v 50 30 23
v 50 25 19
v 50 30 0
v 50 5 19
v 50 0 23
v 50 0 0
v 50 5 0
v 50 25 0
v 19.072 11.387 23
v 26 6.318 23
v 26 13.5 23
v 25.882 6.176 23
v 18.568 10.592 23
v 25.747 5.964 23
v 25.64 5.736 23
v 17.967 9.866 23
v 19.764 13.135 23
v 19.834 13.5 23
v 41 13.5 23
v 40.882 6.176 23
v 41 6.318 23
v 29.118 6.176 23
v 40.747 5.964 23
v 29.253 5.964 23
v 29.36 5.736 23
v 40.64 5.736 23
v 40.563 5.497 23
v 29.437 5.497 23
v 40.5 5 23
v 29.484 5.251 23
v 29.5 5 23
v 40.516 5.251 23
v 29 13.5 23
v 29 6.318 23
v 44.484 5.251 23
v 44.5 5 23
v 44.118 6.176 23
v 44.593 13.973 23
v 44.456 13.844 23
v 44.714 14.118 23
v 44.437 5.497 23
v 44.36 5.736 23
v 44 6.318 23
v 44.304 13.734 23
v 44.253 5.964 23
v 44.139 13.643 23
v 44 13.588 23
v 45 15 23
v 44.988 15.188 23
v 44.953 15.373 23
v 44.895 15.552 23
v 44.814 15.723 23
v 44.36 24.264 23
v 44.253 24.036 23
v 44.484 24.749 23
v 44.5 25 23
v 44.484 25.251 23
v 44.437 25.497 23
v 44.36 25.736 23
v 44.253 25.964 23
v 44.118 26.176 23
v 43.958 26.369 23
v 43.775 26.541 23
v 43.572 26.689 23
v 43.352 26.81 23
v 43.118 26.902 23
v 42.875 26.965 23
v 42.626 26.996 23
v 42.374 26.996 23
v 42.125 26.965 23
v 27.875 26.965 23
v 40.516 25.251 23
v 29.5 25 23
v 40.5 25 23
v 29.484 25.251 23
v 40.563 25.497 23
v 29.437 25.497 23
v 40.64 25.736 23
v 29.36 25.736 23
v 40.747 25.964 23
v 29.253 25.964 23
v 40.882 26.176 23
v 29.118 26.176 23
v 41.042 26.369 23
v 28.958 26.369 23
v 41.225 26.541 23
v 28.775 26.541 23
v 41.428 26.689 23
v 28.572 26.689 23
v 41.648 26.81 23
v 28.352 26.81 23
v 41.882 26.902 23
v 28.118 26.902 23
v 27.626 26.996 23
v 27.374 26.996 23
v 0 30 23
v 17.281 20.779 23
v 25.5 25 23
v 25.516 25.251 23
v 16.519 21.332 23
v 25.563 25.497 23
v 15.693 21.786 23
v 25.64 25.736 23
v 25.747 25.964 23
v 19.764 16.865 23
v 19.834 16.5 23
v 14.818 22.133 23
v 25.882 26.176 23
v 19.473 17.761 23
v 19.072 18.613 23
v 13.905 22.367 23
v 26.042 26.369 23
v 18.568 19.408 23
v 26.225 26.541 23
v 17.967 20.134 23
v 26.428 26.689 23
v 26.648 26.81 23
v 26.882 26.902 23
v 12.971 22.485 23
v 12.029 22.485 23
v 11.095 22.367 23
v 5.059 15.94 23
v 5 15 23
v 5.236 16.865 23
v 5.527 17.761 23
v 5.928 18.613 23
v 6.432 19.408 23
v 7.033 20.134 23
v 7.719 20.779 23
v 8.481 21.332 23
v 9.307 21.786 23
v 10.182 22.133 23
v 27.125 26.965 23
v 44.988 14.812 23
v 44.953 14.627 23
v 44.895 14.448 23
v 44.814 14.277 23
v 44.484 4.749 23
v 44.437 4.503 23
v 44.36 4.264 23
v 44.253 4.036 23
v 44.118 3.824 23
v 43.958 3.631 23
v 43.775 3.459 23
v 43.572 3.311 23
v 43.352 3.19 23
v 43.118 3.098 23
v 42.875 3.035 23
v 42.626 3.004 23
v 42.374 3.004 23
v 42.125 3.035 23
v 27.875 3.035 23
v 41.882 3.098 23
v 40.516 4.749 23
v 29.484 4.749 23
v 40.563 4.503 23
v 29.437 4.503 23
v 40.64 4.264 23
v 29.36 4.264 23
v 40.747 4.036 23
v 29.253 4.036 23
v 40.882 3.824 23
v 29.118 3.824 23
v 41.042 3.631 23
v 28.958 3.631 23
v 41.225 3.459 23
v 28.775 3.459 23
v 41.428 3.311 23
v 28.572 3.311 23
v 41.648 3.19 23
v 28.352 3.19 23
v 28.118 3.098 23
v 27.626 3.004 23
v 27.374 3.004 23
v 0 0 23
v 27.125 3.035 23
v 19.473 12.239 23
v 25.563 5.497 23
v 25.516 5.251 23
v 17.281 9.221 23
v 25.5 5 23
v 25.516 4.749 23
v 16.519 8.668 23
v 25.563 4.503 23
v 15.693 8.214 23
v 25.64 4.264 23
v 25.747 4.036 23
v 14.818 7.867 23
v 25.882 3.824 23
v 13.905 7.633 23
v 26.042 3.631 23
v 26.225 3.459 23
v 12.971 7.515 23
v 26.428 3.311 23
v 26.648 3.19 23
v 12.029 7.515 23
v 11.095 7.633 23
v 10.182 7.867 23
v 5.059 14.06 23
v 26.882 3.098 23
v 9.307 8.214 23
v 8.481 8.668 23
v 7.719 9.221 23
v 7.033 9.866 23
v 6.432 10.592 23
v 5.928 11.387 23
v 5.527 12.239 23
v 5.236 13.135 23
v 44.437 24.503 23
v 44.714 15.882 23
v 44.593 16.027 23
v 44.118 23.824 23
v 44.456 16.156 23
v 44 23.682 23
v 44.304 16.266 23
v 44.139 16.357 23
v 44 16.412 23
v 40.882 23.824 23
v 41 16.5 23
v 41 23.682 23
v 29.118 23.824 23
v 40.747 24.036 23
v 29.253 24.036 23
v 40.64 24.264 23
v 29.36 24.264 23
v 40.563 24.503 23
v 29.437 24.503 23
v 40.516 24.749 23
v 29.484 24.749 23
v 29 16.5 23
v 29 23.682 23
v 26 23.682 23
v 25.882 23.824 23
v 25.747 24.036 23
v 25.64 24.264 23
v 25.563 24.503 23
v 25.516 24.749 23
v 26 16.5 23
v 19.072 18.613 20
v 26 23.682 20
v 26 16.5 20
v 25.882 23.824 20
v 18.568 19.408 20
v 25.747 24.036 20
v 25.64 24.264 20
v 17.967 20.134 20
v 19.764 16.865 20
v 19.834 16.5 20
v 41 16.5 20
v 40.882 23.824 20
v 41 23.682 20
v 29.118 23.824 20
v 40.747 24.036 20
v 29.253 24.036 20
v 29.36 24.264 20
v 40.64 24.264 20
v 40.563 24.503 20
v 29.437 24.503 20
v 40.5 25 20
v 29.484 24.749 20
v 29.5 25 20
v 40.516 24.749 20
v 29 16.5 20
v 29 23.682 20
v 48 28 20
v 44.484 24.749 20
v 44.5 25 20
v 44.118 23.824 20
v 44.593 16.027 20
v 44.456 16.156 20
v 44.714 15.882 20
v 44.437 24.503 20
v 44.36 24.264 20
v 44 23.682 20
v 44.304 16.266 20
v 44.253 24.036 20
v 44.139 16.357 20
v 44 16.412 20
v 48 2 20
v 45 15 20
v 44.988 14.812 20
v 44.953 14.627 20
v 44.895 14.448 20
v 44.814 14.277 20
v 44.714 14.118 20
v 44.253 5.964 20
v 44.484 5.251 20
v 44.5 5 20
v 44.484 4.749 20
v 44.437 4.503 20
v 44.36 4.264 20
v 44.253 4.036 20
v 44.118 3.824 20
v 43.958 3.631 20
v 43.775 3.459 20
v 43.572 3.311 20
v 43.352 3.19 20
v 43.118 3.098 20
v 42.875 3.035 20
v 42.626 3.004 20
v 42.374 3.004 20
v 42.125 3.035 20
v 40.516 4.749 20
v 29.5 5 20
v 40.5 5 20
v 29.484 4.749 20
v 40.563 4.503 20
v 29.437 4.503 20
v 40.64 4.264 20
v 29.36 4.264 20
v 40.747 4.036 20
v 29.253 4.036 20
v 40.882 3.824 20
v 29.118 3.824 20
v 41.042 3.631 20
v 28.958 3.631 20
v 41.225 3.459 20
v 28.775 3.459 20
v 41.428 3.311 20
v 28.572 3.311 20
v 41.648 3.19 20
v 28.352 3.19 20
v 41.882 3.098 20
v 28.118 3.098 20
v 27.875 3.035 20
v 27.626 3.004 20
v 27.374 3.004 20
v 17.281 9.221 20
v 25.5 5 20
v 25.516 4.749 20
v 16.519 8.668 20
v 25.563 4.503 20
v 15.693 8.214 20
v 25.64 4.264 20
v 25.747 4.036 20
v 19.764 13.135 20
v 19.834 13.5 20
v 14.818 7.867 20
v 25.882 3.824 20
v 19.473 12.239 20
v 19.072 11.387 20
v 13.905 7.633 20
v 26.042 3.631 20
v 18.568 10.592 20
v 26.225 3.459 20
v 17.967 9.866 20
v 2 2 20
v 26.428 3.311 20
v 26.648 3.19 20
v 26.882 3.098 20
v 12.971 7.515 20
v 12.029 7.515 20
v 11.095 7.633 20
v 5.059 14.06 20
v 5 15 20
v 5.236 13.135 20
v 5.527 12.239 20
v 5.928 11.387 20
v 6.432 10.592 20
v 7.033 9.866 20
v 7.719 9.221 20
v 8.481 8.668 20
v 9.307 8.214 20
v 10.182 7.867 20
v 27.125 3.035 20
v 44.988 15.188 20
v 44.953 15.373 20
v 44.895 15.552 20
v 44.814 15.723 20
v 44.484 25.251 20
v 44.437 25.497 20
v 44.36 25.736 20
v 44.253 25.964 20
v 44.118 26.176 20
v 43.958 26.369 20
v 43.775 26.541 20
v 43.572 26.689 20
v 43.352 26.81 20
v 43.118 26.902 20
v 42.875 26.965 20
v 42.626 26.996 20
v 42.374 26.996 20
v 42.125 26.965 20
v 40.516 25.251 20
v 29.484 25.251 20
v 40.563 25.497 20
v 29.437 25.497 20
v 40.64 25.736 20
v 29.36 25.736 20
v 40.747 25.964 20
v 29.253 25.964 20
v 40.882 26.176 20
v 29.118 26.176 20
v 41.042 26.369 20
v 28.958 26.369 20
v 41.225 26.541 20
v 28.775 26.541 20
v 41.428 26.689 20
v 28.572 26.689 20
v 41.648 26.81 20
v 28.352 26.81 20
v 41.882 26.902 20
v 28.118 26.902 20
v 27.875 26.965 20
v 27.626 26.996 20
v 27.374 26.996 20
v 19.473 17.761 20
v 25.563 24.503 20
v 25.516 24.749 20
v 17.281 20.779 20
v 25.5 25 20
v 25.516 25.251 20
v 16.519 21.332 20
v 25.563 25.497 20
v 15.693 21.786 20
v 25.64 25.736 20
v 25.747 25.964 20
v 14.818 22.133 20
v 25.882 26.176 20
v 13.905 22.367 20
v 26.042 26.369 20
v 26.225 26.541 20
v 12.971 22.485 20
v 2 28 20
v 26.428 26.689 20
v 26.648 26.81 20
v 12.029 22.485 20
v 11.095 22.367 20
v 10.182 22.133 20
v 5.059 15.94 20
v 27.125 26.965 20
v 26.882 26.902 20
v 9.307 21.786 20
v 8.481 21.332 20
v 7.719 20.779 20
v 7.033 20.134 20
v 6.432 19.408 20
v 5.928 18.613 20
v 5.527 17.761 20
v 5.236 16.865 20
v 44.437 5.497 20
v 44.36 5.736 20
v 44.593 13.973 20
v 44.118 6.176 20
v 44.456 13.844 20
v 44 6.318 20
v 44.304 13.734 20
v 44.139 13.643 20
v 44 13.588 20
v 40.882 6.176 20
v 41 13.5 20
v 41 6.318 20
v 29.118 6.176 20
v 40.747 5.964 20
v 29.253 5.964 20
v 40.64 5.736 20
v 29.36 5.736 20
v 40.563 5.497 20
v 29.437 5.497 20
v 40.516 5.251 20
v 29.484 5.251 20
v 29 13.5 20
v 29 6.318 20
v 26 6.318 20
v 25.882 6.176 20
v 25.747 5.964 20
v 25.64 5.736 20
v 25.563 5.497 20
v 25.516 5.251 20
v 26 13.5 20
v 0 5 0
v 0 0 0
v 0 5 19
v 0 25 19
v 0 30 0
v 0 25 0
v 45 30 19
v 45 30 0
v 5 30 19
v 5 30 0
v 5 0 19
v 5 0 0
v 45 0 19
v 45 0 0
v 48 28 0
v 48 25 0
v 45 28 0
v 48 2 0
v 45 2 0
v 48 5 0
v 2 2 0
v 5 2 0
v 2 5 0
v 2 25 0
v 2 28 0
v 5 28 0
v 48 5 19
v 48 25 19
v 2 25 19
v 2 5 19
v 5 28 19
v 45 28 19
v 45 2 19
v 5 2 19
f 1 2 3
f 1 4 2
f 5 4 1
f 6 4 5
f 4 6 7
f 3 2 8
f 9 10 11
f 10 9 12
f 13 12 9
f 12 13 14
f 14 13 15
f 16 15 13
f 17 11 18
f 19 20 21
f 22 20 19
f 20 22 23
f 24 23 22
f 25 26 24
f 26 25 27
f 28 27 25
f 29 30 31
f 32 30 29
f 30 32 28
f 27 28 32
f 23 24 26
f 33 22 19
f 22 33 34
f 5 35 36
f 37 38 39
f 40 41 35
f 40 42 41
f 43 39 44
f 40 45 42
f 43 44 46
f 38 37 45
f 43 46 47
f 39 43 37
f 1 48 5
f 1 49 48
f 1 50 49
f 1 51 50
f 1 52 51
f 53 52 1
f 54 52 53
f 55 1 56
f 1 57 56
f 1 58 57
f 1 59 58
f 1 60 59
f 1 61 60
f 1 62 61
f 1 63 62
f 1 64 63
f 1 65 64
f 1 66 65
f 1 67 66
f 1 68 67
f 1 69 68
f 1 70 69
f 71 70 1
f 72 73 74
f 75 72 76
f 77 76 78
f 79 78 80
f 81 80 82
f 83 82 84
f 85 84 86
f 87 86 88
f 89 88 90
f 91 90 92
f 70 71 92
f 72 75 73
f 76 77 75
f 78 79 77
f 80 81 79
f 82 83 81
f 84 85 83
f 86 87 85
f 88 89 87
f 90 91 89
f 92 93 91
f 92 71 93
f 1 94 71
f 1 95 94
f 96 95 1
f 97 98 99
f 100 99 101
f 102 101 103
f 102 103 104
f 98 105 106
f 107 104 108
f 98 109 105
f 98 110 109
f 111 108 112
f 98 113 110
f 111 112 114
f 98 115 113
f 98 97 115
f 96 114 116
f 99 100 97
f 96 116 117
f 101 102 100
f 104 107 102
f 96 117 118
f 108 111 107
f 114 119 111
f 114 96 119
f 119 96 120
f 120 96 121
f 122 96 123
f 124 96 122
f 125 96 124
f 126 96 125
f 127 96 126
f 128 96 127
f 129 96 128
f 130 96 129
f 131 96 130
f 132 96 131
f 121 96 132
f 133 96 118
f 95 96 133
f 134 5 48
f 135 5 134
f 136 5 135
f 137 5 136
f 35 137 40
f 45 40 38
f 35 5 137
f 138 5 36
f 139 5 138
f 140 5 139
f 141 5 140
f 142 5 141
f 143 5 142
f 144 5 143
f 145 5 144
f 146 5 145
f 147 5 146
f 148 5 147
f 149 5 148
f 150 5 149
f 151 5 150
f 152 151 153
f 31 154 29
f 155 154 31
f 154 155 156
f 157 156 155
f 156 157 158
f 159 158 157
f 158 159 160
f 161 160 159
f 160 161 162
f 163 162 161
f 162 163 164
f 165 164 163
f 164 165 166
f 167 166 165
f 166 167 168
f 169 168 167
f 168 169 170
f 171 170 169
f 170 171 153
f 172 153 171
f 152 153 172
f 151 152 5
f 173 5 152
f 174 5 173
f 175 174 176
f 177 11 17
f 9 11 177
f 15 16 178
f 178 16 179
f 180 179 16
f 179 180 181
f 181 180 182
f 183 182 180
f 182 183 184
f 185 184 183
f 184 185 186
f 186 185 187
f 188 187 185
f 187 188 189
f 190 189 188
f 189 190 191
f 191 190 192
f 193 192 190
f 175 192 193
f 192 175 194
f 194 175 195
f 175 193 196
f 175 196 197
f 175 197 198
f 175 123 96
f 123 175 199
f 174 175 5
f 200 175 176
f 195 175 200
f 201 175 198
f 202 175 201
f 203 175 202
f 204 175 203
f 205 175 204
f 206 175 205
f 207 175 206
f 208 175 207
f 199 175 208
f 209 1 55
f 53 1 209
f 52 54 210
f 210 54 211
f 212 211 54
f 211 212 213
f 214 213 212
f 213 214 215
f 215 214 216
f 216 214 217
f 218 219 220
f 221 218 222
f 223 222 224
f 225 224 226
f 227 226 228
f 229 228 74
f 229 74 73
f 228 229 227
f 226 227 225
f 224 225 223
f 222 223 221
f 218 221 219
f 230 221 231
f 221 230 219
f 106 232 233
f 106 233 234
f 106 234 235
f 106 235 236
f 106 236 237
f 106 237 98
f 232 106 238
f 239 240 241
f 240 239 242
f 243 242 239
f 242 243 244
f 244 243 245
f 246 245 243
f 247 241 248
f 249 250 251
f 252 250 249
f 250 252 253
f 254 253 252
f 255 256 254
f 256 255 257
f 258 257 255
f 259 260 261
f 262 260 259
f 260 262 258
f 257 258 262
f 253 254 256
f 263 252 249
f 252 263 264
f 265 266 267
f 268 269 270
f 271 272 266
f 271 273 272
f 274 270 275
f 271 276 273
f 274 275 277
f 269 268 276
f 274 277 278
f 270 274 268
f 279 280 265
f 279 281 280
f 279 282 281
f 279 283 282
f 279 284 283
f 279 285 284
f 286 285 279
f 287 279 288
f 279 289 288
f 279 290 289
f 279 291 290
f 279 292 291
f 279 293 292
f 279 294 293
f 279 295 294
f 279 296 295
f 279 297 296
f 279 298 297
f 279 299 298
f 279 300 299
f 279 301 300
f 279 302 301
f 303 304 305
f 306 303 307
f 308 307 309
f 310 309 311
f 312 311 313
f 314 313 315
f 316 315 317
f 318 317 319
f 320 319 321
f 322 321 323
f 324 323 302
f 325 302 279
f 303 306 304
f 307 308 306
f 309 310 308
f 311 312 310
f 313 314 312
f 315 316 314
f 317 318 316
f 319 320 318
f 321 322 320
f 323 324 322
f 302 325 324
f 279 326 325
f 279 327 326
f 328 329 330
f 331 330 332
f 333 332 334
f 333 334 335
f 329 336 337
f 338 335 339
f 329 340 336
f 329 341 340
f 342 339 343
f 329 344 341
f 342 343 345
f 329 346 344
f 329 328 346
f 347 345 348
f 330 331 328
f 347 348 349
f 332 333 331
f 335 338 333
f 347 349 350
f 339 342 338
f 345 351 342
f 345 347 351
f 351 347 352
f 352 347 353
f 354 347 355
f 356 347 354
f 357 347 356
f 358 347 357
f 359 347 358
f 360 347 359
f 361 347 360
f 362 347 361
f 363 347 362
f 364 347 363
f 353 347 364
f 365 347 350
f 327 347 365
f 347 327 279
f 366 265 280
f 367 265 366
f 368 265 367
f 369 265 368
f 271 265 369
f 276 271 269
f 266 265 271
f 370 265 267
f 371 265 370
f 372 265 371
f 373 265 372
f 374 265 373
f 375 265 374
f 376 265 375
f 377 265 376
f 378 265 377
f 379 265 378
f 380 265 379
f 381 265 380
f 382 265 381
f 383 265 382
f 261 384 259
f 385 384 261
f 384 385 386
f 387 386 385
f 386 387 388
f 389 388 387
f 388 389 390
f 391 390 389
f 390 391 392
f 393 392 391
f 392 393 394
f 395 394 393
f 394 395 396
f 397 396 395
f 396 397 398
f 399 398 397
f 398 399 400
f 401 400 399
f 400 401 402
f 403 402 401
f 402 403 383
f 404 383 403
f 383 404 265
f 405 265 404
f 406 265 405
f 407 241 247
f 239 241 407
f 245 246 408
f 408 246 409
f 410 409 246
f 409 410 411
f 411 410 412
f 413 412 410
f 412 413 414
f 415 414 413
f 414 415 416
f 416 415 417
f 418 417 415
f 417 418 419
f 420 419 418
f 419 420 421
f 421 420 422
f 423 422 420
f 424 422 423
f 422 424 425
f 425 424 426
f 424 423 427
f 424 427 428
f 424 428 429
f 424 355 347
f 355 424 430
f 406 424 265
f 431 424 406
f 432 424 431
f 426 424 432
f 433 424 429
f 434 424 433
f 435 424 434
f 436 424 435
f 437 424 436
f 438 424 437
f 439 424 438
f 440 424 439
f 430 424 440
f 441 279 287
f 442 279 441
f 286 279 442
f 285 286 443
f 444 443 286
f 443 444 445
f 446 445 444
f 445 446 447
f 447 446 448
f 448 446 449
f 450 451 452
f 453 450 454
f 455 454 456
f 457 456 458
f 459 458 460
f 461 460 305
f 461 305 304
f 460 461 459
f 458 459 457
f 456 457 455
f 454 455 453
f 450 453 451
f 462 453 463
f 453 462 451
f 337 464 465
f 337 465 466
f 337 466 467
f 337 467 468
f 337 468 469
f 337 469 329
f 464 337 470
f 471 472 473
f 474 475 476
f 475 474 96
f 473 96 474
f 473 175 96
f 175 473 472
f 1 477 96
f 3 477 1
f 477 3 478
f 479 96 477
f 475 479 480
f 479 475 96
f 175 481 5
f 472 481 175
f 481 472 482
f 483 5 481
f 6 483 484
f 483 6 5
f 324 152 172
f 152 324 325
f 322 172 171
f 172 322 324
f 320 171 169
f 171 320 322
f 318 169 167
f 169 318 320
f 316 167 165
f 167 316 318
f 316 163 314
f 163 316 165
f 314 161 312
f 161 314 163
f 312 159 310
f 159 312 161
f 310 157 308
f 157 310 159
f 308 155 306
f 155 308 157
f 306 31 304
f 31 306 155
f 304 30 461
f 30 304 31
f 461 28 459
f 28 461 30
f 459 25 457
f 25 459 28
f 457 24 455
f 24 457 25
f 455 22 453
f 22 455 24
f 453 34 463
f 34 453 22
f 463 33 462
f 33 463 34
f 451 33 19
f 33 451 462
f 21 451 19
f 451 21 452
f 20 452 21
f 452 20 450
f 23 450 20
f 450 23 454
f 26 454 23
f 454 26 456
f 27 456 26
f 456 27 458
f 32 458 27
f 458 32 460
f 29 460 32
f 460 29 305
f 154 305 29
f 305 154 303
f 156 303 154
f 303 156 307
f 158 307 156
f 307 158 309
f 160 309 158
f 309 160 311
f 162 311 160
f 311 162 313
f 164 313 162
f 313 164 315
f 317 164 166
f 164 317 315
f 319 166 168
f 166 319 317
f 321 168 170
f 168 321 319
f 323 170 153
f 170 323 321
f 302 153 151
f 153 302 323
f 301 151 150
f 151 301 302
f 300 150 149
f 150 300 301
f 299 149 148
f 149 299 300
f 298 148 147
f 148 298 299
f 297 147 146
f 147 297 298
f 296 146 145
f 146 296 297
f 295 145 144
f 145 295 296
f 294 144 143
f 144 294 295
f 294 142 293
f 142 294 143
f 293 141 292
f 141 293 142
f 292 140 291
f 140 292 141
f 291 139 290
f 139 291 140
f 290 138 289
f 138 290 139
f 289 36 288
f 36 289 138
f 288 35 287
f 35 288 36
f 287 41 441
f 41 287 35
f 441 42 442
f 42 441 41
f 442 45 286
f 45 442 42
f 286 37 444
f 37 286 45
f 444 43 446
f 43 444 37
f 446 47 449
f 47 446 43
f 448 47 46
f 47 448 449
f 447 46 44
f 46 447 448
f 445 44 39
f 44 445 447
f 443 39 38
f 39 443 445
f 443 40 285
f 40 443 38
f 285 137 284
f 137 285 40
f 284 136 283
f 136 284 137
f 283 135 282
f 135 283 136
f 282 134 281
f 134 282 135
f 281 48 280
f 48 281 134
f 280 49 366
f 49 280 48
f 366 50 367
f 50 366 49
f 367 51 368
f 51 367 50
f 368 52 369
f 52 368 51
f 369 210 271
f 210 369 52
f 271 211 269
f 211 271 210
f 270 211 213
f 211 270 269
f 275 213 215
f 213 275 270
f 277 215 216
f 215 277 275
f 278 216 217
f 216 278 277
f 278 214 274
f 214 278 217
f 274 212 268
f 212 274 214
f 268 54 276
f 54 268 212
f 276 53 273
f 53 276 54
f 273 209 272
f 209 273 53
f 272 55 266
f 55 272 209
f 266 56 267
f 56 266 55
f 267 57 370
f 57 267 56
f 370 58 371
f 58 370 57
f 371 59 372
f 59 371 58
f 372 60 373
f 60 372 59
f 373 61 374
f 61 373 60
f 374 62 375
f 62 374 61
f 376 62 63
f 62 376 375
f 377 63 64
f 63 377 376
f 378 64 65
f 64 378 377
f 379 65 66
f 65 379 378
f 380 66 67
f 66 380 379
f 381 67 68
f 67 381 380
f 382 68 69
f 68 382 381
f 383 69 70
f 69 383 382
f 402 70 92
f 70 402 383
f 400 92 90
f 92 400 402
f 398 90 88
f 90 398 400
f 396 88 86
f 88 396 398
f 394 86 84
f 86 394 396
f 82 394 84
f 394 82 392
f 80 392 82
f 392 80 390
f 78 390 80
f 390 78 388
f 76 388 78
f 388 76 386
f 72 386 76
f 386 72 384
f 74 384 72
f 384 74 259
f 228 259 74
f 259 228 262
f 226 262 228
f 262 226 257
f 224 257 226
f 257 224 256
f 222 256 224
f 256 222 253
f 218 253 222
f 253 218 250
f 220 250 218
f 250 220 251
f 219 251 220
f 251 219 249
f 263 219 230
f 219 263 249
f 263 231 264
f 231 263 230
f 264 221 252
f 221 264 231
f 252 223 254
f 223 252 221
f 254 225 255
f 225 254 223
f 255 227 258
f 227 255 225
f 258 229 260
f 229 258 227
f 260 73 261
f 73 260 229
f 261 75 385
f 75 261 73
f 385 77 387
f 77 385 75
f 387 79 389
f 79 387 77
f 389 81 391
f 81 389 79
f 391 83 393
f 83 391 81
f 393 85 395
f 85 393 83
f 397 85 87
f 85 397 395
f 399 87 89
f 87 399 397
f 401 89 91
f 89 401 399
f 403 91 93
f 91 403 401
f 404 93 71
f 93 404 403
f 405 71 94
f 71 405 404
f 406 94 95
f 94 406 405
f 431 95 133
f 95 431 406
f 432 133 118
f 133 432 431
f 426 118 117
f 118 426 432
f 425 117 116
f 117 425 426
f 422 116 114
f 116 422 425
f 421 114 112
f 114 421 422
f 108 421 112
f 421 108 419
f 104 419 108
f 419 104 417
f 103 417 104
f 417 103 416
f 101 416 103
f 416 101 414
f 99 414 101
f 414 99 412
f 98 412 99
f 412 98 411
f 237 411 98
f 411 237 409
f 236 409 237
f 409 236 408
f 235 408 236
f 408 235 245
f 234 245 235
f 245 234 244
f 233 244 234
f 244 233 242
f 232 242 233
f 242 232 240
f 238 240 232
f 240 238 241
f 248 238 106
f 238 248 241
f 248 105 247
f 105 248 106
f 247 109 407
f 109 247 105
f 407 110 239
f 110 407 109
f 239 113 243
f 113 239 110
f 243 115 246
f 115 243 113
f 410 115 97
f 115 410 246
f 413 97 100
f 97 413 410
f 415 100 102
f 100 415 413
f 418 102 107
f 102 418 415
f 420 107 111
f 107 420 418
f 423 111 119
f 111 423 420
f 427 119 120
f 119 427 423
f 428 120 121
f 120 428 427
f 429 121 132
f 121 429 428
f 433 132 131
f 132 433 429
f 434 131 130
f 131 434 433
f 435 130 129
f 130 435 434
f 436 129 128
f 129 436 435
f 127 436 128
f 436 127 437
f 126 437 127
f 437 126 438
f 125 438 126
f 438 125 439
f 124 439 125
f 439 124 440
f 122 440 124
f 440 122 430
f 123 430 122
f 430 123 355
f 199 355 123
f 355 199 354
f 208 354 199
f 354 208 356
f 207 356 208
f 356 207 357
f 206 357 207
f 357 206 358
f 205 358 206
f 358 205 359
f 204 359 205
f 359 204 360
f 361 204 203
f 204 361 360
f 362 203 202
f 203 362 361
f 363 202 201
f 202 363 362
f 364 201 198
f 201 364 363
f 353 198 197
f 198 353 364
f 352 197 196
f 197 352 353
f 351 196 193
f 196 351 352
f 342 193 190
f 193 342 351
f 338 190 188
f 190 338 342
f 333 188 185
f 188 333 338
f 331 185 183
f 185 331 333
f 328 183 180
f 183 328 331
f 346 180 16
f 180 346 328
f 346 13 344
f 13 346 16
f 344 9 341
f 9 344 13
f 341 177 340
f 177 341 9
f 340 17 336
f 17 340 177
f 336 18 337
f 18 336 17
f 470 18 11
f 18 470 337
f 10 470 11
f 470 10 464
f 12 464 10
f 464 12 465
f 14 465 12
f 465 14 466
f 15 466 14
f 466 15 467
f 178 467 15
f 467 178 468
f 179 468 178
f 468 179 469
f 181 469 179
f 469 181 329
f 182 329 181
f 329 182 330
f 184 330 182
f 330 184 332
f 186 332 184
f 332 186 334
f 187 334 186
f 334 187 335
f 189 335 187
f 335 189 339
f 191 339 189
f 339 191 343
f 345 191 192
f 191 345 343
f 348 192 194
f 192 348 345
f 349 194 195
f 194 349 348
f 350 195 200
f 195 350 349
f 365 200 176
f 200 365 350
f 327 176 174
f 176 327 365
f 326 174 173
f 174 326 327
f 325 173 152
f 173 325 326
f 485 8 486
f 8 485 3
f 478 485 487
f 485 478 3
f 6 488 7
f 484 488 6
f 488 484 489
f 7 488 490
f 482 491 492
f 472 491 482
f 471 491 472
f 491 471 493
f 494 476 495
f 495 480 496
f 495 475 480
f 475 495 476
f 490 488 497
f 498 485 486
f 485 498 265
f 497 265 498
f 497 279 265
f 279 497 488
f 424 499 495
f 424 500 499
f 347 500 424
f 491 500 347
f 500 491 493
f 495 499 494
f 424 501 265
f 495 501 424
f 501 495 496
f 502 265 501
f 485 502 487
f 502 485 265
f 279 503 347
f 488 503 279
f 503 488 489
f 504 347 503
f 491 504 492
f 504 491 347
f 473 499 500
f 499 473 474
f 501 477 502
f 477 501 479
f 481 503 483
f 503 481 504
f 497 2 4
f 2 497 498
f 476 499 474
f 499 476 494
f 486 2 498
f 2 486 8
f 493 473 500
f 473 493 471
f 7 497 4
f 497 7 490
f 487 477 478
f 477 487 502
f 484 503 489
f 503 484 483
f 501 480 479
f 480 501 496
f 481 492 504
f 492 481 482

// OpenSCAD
// Cable Archive - Parametric Cable Organizer
// ============================================
// Modular design: each insert can be stacked with others to cover entire drawers

// === MAIN PARAMETERS ===

/* [Panel Dimensions] */
panel_width = 50;
panel_height = 30;
panel_thickness = 3;

/* [Main Slot Configuration] */
enable_main_slot = true;
slot_width = 3;
entry_diameter = 15;
end_rounding = true;
slot_margin_horizontal = 5;
slot_margin_vertical = 5;

/* [Perpendicular Slots Configuration] */
enable_perpendicular_slots = true;
perpendicular_slot_spacing = 15;
perpendicular_slot_end_radius = 2;

/* [Base Walls Configuration] */
wall_height = 20;
wall_thickness = 2;

/* [Cross Cutout Configuration] */
cross_margin_width = 5;
cross_margin_height = 5;
cross_margin_top = 2;

/* [Rendering Quality] */
$fn = 50;

// === CALCULATED VALUES (DO NOT EDIT) ===
slot_length = panel_width - 2*slot_margin_horizontal - entry_diameter/2 - slot_width/2;
cross_width_horizontal = panel_height - 2*cross_margin_height;
cross_width_vertical = panel_width - 2*cross_margin_width;
num_perpendicular_slots = floor(slot_length / perpendicular_slot_spacing);

// === MODULES ===

module panel() {
    cube([panel_width, panel_height, panel_thickness]);
}

module walls() {
    difference() {
        cube([panel_width, panel_height, wall_height]);
        
        translate([wall_thickness, wall_thickness, -1])
            cube([
                panel_width - 2*wall_thickness, 
                panel_height - 2*wall_thickness, 
                wall_height + 2
            ]);
    }
}

module cross_cutout() {
    cutout_height = wall_height - cross_margin_top + 2;
    
    union() {
        translate([-1, cross_margin_height, -1])
            cube([panel_width + 2, cross_width_horizontal, cutout_height]);
        
        translate([cross_margin_width, -1, -1])
            cube([cross_width_vertical, panel_height + 2, cutout_height]);
    }
}

module base() {
    difference() {
        walls();
        cross_cutout();
    }
}

module cable_slot() {
    union() {
        circle(d = entry_diameter);
        
        translate([0, -slot_width/2, 0])
            square([slot_length, slot_width]);
        
        if (end_rounding) {
            translate([slot_length, 0, 0])
                circle(d = slot_width);
        }
    }
}

module perpendicular_slot_full() {
    available_height_above = panel_height/2 - slot_margin_vertical;
    available_height_below = panel_height/2 - slot_margin_vertical;
    total_length = available_height_above + available_height_below;
    
    union() {
        translate([0, -available_height_below, 0])
            circle(r = perpendicular_slot_end_radius);
        
        translate([-slot_width/2, -available_height_below, 0])
            square([slot_width, total_length]);
        
        translate([0, available_height_above, 0])
            circle(r = perpendicular_slot_end_radius);
    }
}

module all_perpendicular_slots() {
    if (enable_perpendicular_slots && num_perpendicular_slots > 0) {
        for (i = [1:num_perpendicular_slots]) {
            x_pos = i * perpendicular_slot_spacing;
            
            translate([x_pos, 0, 0])
                perpendicular_slot_full();
        }
    }
}

module cable_insert() {
    union() {
        translate([0, 0, wall_height])
            difference() {
                panel();
                
                translate([
                    slot_margin_horizontal + entry_diameter/2, 
                    panel_height/2, 
                    -1
                ])
                    linear_extrude(height = panel_thickness + 2) {
                        if (enable_main_slot) {
                            cable_slot();
                        }
                        all_perpendicular_slots();
                    }
            }
        
        base();
    }
}

// === RENDERING ===

cable_insert();
